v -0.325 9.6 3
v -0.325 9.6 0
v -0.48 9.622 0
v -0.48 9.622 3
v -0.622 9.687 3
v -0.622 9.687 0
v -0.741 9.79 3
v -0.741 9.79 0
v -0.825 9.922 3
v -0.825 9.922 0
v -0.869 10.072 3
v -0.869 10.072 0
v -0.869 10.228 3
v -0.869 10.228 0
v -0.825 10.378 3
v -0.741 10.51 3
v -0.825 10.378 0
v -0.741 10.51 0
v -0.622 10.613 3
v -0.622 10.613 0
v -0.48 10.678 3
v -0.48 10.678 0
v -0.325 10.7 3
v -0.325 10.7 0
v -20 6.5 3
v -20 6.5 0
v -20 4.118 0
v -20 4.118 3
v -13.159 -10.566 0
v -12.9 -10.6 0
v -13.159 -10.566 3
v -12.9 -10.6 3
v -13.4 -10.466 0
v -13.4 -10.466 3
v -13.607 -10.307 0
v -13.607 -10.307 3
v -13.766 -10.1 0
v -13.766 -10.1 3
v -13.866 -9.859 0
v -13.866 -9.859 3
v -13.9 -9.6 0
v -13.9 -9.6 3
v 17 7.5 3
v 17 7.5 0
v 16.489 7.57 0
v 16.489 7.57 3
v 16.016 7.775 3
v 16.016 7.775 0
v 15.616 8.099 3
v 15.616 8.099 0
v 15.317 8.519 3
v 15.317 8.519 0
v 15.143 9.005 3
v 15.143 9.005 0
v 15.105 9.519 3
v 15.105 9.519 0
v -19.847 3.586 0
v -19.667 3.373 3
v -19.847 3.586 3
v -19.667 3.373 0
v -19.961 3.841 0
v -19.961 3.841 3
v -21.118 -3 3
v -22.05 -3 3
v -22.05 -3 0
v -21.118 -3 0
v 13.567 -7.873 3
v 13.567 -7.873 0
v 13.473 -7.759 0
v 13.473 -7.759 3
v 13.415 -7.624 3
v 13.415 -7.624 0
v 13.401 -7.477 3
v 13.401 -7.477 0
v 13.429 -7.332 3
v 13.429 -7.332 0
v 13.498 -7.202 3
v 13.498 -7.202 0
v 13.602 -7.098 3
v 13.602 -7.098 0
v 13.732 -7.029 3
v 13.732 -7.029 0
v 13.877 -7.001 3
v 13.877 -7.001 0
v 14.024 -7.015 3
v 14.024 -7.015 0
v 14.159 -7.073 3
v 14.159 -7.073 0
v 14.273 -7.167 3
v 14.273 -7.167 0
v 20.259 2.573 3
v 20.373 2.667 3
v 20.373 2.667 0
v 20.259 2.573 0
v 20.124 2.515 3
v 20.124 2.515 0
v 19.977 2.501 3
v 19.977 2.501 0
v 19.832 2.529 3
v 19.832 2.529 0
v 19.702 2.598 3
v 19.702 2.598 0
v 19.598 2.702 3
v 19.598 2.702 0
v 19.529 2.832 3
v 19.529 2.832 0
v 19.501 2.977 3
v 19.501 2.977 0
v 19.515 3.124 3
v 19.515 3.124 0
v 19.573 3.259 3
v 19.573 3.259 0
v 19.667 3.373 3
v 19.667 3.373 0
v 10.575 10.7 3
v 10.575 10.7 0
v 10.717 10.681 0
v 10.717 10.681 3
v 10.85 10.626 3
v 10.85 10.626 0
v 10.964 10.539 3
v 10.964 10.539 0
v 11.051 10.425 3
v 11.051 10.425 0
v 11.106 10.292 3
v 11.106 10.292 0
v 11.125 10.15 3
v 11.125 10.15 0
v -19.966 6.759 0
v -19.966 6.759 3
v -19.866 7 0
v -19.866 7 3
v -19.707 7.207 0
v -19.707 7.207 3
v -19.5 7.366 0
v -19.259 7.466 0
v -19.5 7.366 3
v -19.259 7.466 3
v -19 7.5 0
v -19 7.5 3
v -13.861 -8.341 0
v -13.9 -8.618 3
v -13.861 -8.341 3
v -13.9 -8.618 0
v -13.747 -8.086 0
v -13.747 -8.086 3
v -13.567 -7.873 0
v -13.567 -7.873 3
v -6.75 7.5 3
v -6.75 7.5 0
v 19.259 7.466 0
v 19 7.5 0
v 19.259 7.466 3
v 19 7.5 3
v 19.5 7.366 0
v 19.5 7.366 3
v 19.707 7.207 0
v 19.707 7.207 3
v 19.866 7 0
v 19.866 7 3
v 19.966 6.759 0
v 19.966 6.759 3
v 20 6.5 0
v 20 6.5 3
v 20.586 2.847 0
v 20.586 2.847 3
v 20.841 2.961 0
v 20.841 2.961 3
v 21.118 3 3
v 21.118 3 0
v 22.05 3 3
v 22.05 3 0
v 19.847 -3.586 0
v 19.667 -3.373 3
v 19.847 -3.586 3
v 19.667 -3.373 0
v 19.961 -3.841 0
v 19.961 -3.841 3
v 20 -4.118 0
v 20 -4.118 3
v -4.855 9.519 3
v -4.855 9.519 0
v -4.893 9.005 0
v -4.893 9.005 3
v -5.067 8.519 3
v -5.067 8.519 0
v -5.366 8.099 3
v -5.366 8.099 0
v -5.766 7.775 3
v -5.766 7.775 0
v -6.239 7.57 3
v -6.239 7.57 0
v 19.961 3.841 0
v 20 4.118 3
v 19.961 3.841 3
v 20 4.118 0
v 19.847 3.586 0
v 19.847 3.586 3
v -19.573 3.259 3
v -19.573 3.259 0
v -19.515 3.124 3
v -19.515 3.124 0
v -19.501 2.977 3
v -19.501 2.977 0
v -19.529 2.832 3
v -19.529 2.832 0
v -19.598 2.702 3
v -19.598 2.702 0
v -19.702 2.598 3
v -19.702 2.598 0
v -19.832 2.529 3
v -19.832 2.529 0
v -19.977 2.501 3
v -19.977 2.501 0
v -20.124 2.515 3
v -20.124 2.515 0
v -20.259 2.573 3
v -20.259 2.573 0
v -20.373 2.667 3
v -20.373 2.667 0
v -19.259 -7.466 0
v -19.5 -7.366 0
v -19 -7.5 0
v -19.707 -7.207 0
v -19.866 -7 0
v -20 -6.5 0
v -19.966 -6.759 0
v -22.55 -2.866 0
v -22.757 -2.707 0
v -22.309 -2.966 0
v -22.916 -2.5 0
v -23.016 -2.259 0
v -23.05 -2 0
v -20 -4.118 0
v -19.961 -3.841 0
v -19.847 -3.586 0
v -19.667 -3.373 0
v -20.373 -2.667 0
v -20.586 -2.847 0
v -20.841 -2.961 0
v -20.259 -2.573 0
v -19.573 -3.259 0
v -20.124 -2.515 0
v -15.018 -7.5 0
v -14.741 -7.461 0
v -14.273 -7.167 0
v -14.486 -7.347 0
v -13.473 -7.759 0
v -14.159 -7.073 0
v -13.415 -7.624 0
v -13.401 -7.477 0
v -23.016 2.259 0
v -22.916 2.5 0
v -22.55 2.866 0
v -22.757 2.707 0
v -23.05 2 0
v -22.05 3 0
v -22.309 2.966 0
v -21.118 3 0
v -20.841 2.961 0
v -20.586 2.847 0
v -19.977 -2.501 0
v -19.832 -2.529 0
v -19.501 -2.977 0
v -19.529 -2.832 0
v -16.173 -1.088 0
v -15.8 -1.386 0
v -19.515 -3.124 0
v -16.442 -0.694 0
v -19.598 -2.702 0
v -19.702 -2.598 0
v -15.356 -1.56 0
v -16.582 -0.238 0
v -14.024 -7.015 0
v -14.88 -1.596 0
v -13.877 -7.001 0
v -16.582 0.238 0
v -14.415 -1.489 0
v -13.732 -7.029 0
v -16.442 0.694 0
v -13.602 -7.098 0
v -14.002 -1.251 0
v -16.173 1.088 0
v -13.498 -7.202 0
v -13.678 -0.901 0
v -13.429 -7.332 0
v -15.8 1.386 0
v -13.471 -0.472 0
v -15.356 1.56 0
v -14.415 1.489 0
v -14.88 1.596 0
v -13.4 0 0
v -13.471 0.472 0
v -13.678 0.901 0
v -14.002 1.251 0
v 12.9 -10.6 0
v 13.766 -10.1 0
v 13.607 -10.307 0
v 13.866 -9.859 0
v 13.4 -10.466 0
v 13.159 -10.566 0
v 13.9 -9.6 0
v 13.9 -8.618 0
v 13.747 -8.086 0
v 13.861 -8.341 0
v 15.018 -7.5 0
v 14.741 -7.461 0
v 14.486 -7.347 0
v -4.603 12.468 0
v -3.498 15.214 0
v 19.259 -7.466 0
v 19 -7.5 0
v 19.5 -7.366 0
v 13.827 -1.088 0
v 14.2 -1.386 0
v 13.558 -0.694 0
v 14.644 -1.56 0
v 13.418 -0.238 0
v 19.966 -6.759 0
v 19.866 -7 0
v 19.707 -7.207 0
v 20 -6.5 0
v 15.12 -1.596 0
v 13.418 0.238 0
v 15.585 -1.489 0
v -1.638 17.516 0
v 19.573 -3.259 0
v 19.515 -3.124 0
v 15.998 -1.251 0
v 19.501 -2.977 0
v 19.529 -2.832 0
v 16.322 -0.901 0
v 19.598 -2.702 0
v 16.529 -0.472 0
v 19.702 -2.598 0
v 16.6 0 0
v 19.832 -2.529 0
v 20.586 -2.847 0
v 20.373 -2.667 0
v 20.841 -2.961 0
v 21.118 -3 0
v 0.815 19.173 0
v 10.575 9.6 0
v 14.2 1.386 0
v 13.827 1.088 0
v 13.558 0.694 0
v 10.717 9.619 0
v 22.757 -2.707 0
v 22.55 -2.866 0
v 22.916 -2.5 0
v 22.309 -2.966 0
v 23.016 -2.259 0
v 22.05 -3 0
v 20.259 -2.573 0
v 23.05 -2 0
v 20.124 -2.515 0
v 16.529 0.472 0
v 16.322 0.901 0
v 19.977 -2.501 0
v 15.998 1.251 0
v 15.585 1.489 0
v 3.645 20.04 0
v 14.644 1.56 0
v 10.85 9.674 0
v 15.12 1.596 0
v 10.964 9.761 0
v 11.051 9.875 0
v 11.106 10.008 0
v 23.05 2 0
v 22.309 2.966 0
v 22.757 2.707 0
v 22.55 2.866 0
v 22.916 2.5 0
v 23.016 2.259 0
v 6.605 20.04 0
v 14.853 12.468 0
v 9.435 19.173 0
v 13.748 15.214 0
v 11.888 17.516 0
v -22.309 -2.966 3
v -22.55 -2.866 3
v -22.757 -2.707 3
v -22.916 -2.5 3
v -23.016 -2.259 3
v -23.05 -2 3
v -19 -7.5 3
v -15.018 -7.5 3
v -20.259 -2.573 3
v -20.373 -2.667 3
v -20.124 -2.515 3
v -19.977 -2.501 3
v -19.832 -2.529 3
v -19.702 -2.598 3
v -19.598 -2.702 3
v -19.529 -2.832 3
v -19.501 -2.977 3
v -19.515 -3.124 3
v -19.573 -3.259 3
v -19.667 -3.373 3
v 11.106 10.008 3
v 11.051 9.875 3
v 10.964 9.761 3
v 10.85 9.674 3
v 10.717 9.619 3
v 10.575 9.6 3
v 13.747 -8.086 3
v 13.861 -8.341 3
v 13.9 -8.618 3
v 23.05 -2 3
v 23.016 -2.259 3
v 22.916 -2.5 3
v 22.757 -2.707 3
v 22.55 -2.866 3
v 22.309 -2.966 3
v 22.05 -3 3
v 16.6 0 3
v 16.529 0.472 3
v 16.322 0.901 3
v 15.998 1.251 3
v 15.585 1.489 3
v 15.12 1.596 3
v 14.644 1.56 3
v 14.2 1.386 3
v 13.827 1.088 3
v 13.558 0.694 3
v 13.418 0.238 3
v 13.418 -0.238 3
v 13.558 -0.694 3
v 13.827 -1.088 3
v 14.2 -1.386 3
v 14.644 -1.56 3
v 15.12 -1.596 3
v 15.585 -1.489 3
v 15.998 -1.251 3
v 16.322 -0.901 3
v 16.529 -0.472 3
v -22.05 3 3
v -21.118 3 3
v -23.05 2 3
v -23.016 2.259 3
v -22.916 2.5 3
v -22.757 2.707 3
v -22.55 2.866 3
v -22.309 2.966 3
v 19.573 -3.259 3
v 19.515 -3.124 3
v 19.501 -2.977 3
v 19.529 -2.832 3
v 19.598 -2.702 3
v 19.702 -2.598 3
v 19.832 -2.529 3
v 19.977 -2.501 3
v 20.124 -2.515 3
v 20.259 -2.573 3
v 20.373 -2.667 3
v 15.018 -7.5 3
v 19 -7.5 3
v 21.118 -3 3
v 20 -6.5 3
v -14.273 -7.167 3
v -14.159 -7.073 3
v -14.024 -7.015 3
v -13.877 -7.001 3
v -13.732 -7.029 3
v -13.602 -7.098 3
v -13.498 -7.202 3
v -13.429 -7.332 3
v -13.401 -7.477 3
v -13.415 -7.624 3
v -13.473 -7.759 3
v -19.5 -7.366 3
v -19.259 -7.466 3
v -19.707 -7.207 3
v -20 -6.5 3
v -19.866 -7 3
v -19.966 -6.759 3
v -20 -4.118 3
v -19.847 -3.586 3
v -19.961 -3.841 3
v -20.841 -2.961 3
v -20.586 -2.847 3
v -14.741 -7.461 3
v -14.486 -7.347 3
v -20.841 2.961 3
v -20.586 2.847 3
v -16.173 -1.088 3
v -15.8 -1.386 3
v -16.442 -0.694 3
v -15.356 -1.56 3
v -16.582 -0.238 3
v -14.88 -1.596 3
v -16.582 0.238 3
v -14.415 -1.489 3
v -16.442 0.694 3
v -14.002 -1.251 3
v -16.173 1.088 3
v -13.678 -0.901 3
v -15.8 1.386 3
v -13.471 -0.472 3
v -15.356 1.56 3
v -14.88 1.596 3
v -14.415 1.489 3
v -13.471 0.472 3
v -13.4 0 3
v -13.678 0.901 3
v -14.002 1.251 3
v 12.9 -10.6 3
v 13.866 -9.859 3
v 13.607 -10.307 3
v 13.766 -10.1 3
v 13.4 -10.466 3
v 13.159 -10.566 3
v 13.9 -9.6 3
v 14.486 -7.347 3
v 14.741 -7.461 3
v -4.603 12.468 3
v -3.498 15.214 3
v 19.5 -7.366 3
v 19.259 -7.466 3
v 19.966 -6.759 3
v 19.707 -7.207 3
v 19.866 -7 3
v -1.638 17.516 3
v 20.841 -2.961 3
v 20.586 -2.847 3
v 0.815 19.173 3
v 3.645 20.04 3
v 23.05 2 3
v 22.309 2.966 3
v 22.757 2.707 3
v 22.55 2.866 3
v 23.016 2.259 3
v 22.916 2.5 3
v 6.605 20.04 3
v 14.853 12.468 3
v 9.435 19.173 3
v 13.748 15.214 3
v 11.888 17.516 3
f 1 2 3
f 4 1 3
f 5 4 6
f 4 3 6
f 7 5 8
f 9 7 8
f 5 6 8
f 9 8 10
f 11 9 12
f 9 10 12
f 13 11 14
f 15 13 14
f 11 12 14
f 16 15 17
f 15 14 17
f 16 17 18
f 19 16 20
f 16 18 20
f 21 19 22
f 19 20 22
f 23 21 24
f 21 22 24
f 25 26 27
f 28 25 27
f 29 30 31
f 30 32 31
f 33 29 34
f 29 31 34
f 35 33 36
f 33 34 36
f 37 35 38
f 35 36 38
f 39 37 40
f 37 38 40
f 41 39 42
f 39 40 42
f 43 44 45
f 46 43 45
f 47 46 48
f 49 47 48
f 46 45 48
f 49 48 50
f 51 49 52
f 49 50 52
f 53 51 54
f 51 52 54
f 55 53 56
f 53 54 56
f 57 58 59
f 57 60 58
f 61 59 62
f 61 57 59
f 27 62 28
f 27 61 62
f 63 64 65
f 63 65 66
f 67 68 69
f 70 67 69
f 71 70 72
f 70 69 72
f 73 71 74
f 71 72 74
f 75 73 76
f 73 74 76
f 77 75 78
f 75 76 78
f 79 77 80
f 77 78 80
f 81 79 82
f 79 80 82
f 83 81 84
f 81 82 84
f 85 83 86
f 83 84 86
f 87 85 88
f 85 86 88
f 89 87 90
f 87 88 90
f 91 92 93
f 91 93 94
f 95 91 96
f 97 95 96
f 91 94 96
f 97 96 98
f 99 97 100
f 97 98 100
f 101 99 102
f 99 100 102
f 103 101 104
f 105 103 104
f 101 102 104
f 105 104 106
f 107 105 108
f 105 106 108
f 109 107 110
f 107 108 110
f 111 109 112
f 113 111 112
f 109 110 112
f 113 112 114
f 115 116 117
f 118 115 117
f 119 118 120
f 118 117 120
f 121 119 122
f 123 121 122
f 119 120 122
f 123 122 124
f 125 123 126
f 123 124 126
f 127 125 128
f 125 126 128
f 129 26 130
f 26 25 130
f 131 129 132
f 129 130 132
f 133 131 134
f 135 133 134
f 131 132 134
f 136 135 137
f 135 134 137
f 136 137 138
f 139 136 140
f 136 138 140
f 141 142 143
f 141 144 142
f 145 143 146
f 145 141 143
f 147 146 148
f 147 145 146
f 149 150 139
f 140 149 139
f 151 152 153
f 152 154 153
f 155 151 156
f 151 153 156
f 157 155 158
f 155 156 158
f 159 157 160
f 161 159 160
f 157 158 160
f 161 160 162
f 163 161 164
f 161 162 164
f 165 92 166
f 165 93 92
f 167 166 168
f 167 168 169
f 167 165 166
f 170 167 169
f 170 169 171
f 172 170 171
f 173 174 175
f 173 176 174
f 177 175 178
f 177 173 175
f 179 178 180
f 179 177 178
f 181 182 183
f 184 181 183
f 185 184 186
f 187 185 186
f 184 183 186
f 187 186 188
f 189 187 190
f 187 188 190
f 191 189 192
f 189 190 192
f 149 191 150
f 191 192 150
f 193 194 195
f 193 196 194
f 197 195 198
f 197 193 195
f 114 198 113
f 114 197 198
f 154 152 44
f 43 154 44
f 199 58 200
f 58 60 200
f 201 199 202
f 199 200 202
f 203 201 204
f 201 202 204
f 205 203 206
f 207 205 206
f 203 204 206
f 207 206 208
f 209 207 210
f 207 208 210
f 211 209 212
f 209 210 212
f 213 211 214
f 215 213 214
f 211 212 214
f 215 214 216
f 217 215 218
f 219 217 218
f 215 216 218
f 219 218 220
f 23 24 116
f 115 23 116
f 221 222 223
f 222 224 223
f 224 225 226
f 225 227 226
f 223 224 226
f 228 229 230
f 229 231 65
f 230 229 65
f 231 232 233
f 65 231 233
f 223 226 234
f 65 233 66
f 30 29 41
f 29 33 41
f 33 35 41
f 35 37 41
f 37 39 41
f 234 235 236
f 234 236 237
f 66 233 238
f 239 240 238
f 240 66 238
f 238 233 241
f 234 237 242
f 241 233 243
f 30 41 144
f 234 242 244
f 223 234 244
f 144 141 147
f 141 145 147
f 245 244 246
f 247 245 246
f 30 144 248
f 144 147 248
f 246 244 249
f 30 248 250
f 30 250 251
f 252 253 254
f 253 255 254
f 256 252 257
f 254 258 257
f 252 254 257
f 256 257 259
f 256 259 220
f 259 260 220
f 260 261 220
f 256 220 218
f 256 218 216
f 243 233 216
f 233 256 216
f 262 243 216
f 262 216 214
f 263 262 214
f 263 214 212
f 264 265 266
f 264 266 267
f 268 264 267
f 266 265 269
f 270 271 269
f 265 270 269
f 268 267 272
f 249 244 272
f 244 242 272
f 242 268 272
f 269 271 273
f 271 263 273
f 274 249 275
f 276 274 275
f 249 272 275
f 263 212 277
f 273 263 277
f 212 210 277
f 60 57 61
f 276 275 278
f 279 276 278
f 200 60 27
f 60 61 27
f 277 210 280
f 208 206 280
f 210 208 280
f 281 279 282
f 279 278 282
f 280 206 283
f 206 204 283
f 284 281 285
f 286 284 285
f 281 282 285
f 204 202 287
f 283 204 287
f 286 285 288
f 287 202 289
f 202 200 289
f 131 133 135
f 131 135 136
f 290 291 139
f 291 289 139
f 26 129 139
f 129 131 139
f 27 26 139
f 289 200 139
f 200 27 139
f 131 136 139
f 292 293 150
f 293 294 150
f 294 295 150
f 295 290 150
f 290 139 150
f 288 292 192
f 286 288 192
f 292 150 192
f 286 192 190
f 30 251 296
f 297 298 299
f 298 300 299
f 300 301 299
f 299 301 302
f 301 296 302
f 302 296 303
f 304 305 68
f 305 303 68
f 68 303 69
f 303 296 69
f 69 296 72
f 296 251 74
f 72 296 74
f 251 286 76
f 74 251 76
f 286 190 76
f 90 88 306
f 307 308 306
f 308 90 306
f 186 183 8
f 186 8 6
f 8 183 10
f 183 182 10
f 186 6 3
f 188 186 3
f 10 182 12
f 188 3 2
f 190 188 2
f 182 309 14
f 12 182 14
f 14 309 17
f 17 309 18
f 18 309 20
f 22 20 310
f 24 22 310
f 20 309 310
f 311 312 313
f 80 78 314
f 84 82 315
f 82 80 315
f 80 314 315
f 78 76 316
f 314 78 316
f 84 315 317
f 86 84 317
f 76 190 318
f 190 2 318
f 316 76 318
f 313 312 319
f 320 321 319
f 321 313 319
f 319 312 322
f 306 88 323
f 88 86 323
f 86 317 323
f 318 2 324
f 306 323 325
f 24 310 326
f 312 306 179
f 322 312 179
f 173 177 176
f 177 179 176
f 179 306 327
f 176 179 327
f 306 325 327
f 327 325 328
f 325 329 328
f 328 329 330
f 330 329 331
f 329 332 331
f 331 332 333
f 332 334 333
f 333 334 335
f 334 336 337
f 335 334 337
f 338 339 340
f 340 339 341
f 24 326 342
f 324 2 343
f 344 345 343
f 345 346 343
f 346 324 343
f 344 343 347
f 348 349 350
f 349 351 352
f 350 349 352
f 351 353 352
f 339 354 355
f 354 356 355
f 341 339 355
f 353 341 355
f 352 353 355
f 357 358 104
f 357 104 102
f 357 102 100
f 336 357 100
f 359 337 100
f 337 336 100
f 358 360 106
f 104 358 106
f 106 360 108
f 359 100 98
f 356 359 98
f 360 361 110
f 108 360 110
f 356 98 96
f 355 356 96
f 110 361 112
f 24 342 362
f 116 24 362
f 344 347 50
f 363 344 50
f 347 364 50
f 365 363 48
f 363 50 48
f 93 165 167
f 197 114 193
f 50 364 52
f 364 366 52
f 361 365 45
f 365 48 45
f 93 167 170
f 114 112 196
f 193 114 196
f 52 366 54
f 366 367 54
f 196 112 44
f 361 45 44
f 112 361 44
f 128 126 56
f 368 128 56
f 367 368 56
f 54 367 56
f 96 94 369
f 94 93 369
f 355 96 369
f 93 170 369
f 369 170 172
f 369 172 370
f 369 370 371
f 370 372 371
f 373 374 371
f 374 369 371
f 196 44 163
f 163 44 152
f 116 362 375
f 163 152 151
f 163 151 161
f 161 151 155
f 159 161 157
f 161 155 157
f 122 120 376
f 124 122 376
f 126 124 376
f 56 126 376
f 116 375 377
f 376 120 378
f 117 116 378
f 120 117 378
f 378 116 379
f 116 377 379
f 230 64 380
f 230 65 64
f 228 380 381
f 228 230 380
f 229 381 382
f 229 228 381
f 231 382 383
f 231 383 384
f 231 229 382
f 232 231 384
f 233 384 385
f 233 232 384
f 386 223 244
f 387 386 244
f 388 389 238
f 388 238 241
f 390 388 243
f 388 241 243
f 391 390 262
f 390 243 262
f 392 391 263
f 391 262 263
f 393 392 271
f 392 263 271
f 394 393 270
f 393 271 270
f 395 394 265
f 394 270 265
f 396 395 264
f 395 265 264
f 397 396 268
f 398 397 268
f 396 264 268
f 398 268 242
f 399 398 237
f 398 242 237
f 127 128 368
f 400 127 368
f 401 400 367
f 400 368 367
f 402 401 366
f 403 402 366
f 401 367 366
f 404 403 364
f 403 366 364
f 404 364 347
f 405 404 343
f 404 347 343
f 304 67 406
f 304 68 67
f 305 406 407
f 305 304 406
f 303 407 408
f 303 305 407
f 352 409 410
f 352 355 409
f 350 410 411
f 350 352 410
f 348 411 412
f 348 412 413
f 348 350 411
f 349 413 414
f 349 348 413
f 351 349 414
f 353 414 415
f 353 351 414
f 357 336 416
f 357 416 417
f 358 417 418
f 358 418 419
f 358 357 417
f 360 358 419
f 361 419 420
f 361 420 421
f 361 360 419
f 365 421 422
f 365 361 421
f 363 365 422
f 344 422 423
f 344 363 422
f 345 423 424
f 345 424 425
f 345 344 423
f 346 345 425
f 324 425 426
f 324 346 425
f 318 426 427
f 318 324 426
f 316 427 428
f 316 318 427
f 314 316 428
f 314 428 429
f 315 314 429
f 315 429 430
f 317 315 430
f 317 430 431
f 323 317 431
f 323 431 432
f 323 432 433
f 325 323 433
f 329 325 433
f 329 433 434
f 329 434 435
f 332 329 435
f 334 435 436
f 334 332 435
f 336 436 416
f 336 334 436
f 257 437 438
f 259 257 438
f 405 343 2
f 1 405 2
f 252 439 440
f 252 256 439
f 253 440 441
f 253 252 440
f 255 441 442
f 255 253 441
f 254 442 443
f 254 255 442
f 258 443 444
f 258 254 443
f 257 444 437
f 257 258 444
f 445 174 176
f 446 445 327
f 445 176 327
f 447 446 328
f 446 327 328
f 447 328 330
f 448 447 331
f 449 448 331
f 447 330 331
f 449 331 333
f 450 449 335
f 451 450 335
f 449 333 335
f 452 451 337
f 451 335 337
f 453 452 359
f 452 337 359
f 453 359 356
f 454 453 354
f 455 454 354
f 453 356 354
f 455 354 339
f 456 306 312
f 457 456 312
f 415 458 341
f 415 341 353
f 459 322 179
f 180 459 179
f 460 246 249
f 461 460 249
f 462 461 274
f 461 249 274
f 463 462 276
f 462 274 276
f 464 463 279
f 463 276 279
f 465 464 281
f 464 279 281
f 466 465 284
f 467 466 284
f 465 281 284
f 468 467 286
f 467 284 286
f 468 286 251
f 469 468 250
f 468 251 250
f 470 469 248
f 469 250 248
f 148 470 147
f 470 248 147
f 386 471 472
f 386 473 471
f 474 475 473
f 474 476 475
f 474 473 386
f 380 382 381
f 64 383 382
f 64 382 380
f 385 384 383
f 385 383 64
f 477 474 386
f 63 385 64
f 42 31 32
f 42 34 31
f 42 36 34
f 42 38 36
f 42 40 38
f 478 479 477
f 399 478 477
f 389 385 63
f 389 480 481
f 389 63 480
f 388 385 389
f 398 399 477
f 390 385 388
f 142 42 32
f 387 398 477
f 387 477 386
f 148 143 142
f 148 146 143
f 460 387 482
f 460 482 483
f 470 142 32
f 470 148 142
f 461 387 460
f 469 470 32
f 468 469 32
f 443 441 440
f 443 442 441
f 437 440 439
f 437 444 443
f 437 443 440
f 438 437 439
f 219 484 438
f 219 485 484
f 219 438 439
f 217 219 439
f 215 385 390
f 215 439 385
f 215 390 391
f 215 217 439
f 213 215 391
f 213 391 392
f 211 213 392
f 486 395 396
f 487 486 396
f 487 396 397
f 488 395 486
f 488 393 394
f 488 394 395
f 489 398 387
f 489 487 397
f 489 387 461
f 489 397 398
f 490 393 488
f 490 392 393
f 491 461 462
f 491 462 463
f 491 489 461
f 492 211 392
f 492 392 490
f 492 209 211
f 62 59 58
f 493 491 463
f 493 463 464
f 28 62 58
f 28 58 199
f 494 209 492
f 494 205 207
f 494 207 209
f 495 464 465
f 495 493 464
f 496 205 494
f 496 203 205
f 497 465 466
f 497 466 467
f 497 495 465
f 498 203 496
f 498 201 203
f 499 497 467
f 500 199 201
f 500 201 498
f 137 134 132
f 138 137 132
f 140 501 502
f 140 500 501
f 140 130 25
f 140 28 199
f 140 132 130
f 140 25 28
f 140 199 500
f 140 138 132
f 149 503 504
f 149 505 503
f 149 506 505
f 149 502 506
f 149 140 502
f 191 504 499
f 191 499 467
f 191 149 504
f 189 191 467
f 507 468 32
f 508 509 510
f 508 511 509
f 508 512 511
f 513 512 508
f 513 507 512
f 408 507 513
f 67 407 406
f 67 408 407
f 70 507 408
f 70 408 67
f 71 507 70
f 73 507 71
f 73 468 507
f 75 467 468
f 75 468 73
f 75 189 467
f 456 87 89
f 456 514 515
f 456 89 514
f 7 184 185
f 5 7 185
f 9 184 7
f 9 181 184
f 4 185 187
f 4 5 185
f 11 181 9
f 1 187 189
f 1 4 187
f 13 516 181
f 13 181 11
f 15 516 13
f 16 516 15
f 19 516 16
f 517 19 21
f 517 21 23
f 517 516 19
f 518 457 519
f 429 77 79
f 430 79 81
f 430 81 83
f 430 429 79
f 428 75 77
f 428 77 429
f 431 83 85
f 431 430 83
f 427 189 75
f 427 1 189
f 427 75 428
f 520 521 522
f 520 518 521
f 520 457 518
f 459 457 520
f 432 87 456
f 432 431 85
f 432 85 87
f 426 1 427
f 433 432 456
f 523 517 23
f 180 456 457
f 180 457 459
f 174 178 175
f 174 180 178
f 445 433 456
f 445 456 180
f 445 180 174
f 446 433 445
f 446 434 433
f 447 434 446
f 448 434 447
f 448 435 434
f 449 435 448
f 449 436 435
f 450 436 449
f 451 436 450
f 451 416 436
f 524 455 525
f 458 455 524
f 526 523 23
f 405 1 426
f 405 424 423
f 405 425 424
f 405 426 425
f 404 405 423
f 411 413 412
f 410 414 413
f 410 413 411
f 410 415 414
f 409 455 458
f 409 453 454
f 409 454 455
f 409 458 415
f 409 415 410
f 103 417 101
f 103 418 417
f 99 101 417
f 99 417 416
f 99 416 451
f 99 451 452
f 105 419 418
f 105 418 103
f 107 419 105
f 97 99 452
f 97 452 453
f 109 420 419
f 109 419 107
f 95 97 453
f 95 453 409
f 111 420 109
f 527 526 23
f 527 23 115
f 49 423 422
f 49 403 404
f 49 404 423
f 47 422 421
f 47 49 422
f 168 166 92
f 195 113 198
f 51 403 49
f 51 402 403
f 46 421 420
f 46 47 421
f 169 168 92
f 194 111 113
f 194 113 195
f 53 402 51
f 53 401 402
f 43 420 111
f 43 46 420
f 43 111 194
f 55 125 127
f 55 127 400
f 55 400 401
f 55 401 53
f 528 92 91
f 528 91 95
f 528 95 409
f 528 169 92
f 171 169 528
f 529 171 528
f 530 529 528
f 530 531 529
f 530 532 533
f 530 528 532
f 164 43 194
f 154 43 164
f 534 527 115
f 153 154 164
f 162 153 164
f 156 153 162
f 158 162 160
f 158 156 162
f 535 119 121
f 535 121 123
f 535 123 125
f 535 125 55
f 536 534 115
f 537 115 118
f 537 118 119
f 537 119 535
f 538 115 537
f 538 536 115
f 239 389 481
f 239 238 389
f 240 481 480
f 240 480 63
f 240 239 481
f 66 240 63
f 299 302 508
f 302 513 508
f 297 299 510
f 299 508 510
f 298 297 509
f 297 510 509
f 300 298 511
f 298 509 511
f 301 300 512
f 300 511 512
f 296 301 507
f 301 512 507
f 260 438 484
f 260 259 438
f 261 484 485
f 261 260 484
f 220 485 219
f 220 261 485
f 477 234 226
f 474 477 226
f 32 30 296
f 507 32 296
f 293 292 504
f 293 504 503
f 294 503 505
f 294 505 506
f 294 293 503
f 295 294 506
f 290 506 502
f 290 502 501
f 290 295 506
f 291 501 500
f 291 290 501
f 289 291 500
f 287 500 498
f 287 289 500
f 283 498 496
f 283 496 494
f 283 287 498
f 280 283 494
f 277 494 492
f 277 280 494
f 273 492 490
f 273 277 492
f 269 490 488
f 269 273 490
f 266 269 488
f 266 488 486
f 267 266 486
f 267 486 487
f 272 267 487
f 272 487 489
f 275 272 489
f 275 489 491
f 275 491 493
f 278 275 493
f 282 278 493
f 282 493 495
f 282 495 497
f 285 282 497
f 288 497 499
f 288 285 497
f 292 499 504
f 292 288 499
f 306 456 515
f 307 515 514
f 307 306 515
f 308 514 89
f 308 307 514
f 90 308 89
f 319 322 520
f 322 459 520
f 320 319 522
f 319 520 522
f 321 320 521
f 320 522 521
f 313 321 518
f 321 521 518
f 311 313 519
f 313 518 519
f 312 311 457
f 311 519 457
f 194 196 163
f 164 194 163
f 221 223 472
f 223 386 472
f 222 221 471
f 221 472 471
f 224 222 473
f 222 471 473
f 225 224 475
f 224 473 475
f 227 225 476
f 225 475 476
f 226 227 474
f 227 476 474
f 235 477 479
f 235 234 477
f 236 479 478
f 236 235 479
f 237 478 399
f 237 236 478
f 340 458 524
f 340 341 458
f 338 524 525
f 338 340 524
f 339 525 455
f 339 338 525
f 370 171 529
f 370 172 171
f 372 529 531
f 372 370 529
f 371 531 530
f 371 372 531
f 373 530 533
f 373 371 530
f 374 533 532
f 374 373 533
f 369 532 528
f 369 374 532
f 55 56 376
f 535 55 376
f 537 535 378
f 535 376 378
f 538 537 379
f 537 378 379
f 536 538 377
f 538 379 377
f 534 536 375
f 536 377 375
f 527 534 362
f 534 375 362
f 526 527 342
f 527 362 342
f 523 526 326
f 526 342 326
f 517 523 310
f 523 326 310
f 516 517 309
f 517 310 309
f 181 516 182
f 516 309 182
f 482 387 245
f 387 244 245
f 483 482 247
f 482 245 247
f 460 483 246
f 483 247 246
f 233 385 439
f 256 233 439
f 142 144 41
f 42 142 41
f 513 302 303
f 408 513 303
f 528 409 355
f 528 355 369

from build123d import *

# Parameters (mm, degrees)
F0_R     = 1.6
F1_DEPTH = 3
F2_W     = 3.05
F2_H     = 6
F3_DEPTH = 3
F5_D     = 1
F6_R     = 1


with BuildPart() as f1:
    # F0 (on Top) → F1 (new body)
    with BuildSketch(Plane.XY):
        with BuildLine():
            Line((-20, 0), (-20, -7.5))
            Line((-20, -7.5), (-13.9, -7.5))
            Line((-13.9, -7.5), (-13.9, -10.6))
            Line((-13.9, -10.6), (13.9, -10.6))
            Line((13.9, -10.6), (13.9, -7.5))
            Line((13.9, -7.5), (20, -7.5))
            Line((20, -7.5), (20, 0))
            Line((20, 0), (20, 7.5))
            Line((20, 7.5), (17, 7.5))
            ThreePointArc((17, 7.5), (15.615651922, 8.0992038794), (15.1050482082, 9.5186223298))
            ThreePointArc((15.1050482082, 9.5186223298), (5.125, 20.15), (-4.8550482082, 9.5186223298))
            ThreePointArc((-4.8550482082, 9.5186223298), (-5.365651922, 8.0992038794), (-6.75, 7.5))
            Line((-6.75, 7.5), (-20, 7.5))
            Line((-20, 7.5), (-20, 0))
        make_face()
        with Locations((-15, 0)):
            Circle(F0_R, mode=Mode.SUBTRACT)
        with Locations((15, 0)):
            Circle(F0_R, mode=Mode.SUBTRACT)
        with BuildLine():
            ThreePointArc((-0.325, 9.6), (-0.875, 10.15), (-0.325, 10.7))
            Line((-0.325, 10.7), (10.575, 10.7))
            ThreePointArc((10.575, 10.7), (10.9639087297, 10.5389087297), (11.125, 10.15))
            ThreePointArc((11.125, 10.15), (10.9639087297, 9.7610912703), (10.575, 9.6))
            Line((10.575, 9.6), (-0.325, 9.6))
        make_face(mode=Mode.SUBTRACT)
    extrude(amount=F1_DEPTH)

    # F2 (on face) → F3 (join, through all)
    with BuildSketch(Plane.XY.offset(3)):
        with Locations((-21.525, 0)):
            Rectangle(F2_W, F2_H)
        with Locations((21.525, 0)):
            Rectangle(F2_W, F2_H)
    extrude(amount=-F3_DEPTH)

    # F5 (through all)
    with Locations(Plane.XY.offset(3)):
        with Locations((13.9, -7.5), (20, -3), (20, 3), (-13.9, -7.5), (-20, -3), (-20, 3)):
            Hole(F5_D / 2)

    # F6
    f6_edges = [f1.edges().sort_by_distance(p)[0] for p in [
        (20, 7.5, 1.5),
        (23.05, 3, 1.5),
        (23.05, -3, 1.5),
        (13.9, -10.6, 1.5),
        (20, -7.5, 1.5),
        (-23.05, 3, 1.5),
        (-20, 7.5, 1.5),
        (-20, -7.5, 1.5),
        (-13.9, -10.6, 1.5),
        (-23.05, -3, 1.5),
        (20, 3.5, 1.5),
        (20.5, 3, 1.5),
        (20.5, -3, 1.5),
        (20, -3.5, 1.5),
        (14.4, -7.5, 1.5),
        (13.9, -8, 1.5),
        (-13.9, -8, 1.5),
        (-14.4, -7.5, 1.5),
        (-20, -3.5, 1.5),
        (-20.5, -3, 1.5),
        (-20.5, 3, 1.5),
        (-20, 3.5, 1.5),
    ]]
    fillet(f6_edges, radius=F6_R)


solid = f1.part
